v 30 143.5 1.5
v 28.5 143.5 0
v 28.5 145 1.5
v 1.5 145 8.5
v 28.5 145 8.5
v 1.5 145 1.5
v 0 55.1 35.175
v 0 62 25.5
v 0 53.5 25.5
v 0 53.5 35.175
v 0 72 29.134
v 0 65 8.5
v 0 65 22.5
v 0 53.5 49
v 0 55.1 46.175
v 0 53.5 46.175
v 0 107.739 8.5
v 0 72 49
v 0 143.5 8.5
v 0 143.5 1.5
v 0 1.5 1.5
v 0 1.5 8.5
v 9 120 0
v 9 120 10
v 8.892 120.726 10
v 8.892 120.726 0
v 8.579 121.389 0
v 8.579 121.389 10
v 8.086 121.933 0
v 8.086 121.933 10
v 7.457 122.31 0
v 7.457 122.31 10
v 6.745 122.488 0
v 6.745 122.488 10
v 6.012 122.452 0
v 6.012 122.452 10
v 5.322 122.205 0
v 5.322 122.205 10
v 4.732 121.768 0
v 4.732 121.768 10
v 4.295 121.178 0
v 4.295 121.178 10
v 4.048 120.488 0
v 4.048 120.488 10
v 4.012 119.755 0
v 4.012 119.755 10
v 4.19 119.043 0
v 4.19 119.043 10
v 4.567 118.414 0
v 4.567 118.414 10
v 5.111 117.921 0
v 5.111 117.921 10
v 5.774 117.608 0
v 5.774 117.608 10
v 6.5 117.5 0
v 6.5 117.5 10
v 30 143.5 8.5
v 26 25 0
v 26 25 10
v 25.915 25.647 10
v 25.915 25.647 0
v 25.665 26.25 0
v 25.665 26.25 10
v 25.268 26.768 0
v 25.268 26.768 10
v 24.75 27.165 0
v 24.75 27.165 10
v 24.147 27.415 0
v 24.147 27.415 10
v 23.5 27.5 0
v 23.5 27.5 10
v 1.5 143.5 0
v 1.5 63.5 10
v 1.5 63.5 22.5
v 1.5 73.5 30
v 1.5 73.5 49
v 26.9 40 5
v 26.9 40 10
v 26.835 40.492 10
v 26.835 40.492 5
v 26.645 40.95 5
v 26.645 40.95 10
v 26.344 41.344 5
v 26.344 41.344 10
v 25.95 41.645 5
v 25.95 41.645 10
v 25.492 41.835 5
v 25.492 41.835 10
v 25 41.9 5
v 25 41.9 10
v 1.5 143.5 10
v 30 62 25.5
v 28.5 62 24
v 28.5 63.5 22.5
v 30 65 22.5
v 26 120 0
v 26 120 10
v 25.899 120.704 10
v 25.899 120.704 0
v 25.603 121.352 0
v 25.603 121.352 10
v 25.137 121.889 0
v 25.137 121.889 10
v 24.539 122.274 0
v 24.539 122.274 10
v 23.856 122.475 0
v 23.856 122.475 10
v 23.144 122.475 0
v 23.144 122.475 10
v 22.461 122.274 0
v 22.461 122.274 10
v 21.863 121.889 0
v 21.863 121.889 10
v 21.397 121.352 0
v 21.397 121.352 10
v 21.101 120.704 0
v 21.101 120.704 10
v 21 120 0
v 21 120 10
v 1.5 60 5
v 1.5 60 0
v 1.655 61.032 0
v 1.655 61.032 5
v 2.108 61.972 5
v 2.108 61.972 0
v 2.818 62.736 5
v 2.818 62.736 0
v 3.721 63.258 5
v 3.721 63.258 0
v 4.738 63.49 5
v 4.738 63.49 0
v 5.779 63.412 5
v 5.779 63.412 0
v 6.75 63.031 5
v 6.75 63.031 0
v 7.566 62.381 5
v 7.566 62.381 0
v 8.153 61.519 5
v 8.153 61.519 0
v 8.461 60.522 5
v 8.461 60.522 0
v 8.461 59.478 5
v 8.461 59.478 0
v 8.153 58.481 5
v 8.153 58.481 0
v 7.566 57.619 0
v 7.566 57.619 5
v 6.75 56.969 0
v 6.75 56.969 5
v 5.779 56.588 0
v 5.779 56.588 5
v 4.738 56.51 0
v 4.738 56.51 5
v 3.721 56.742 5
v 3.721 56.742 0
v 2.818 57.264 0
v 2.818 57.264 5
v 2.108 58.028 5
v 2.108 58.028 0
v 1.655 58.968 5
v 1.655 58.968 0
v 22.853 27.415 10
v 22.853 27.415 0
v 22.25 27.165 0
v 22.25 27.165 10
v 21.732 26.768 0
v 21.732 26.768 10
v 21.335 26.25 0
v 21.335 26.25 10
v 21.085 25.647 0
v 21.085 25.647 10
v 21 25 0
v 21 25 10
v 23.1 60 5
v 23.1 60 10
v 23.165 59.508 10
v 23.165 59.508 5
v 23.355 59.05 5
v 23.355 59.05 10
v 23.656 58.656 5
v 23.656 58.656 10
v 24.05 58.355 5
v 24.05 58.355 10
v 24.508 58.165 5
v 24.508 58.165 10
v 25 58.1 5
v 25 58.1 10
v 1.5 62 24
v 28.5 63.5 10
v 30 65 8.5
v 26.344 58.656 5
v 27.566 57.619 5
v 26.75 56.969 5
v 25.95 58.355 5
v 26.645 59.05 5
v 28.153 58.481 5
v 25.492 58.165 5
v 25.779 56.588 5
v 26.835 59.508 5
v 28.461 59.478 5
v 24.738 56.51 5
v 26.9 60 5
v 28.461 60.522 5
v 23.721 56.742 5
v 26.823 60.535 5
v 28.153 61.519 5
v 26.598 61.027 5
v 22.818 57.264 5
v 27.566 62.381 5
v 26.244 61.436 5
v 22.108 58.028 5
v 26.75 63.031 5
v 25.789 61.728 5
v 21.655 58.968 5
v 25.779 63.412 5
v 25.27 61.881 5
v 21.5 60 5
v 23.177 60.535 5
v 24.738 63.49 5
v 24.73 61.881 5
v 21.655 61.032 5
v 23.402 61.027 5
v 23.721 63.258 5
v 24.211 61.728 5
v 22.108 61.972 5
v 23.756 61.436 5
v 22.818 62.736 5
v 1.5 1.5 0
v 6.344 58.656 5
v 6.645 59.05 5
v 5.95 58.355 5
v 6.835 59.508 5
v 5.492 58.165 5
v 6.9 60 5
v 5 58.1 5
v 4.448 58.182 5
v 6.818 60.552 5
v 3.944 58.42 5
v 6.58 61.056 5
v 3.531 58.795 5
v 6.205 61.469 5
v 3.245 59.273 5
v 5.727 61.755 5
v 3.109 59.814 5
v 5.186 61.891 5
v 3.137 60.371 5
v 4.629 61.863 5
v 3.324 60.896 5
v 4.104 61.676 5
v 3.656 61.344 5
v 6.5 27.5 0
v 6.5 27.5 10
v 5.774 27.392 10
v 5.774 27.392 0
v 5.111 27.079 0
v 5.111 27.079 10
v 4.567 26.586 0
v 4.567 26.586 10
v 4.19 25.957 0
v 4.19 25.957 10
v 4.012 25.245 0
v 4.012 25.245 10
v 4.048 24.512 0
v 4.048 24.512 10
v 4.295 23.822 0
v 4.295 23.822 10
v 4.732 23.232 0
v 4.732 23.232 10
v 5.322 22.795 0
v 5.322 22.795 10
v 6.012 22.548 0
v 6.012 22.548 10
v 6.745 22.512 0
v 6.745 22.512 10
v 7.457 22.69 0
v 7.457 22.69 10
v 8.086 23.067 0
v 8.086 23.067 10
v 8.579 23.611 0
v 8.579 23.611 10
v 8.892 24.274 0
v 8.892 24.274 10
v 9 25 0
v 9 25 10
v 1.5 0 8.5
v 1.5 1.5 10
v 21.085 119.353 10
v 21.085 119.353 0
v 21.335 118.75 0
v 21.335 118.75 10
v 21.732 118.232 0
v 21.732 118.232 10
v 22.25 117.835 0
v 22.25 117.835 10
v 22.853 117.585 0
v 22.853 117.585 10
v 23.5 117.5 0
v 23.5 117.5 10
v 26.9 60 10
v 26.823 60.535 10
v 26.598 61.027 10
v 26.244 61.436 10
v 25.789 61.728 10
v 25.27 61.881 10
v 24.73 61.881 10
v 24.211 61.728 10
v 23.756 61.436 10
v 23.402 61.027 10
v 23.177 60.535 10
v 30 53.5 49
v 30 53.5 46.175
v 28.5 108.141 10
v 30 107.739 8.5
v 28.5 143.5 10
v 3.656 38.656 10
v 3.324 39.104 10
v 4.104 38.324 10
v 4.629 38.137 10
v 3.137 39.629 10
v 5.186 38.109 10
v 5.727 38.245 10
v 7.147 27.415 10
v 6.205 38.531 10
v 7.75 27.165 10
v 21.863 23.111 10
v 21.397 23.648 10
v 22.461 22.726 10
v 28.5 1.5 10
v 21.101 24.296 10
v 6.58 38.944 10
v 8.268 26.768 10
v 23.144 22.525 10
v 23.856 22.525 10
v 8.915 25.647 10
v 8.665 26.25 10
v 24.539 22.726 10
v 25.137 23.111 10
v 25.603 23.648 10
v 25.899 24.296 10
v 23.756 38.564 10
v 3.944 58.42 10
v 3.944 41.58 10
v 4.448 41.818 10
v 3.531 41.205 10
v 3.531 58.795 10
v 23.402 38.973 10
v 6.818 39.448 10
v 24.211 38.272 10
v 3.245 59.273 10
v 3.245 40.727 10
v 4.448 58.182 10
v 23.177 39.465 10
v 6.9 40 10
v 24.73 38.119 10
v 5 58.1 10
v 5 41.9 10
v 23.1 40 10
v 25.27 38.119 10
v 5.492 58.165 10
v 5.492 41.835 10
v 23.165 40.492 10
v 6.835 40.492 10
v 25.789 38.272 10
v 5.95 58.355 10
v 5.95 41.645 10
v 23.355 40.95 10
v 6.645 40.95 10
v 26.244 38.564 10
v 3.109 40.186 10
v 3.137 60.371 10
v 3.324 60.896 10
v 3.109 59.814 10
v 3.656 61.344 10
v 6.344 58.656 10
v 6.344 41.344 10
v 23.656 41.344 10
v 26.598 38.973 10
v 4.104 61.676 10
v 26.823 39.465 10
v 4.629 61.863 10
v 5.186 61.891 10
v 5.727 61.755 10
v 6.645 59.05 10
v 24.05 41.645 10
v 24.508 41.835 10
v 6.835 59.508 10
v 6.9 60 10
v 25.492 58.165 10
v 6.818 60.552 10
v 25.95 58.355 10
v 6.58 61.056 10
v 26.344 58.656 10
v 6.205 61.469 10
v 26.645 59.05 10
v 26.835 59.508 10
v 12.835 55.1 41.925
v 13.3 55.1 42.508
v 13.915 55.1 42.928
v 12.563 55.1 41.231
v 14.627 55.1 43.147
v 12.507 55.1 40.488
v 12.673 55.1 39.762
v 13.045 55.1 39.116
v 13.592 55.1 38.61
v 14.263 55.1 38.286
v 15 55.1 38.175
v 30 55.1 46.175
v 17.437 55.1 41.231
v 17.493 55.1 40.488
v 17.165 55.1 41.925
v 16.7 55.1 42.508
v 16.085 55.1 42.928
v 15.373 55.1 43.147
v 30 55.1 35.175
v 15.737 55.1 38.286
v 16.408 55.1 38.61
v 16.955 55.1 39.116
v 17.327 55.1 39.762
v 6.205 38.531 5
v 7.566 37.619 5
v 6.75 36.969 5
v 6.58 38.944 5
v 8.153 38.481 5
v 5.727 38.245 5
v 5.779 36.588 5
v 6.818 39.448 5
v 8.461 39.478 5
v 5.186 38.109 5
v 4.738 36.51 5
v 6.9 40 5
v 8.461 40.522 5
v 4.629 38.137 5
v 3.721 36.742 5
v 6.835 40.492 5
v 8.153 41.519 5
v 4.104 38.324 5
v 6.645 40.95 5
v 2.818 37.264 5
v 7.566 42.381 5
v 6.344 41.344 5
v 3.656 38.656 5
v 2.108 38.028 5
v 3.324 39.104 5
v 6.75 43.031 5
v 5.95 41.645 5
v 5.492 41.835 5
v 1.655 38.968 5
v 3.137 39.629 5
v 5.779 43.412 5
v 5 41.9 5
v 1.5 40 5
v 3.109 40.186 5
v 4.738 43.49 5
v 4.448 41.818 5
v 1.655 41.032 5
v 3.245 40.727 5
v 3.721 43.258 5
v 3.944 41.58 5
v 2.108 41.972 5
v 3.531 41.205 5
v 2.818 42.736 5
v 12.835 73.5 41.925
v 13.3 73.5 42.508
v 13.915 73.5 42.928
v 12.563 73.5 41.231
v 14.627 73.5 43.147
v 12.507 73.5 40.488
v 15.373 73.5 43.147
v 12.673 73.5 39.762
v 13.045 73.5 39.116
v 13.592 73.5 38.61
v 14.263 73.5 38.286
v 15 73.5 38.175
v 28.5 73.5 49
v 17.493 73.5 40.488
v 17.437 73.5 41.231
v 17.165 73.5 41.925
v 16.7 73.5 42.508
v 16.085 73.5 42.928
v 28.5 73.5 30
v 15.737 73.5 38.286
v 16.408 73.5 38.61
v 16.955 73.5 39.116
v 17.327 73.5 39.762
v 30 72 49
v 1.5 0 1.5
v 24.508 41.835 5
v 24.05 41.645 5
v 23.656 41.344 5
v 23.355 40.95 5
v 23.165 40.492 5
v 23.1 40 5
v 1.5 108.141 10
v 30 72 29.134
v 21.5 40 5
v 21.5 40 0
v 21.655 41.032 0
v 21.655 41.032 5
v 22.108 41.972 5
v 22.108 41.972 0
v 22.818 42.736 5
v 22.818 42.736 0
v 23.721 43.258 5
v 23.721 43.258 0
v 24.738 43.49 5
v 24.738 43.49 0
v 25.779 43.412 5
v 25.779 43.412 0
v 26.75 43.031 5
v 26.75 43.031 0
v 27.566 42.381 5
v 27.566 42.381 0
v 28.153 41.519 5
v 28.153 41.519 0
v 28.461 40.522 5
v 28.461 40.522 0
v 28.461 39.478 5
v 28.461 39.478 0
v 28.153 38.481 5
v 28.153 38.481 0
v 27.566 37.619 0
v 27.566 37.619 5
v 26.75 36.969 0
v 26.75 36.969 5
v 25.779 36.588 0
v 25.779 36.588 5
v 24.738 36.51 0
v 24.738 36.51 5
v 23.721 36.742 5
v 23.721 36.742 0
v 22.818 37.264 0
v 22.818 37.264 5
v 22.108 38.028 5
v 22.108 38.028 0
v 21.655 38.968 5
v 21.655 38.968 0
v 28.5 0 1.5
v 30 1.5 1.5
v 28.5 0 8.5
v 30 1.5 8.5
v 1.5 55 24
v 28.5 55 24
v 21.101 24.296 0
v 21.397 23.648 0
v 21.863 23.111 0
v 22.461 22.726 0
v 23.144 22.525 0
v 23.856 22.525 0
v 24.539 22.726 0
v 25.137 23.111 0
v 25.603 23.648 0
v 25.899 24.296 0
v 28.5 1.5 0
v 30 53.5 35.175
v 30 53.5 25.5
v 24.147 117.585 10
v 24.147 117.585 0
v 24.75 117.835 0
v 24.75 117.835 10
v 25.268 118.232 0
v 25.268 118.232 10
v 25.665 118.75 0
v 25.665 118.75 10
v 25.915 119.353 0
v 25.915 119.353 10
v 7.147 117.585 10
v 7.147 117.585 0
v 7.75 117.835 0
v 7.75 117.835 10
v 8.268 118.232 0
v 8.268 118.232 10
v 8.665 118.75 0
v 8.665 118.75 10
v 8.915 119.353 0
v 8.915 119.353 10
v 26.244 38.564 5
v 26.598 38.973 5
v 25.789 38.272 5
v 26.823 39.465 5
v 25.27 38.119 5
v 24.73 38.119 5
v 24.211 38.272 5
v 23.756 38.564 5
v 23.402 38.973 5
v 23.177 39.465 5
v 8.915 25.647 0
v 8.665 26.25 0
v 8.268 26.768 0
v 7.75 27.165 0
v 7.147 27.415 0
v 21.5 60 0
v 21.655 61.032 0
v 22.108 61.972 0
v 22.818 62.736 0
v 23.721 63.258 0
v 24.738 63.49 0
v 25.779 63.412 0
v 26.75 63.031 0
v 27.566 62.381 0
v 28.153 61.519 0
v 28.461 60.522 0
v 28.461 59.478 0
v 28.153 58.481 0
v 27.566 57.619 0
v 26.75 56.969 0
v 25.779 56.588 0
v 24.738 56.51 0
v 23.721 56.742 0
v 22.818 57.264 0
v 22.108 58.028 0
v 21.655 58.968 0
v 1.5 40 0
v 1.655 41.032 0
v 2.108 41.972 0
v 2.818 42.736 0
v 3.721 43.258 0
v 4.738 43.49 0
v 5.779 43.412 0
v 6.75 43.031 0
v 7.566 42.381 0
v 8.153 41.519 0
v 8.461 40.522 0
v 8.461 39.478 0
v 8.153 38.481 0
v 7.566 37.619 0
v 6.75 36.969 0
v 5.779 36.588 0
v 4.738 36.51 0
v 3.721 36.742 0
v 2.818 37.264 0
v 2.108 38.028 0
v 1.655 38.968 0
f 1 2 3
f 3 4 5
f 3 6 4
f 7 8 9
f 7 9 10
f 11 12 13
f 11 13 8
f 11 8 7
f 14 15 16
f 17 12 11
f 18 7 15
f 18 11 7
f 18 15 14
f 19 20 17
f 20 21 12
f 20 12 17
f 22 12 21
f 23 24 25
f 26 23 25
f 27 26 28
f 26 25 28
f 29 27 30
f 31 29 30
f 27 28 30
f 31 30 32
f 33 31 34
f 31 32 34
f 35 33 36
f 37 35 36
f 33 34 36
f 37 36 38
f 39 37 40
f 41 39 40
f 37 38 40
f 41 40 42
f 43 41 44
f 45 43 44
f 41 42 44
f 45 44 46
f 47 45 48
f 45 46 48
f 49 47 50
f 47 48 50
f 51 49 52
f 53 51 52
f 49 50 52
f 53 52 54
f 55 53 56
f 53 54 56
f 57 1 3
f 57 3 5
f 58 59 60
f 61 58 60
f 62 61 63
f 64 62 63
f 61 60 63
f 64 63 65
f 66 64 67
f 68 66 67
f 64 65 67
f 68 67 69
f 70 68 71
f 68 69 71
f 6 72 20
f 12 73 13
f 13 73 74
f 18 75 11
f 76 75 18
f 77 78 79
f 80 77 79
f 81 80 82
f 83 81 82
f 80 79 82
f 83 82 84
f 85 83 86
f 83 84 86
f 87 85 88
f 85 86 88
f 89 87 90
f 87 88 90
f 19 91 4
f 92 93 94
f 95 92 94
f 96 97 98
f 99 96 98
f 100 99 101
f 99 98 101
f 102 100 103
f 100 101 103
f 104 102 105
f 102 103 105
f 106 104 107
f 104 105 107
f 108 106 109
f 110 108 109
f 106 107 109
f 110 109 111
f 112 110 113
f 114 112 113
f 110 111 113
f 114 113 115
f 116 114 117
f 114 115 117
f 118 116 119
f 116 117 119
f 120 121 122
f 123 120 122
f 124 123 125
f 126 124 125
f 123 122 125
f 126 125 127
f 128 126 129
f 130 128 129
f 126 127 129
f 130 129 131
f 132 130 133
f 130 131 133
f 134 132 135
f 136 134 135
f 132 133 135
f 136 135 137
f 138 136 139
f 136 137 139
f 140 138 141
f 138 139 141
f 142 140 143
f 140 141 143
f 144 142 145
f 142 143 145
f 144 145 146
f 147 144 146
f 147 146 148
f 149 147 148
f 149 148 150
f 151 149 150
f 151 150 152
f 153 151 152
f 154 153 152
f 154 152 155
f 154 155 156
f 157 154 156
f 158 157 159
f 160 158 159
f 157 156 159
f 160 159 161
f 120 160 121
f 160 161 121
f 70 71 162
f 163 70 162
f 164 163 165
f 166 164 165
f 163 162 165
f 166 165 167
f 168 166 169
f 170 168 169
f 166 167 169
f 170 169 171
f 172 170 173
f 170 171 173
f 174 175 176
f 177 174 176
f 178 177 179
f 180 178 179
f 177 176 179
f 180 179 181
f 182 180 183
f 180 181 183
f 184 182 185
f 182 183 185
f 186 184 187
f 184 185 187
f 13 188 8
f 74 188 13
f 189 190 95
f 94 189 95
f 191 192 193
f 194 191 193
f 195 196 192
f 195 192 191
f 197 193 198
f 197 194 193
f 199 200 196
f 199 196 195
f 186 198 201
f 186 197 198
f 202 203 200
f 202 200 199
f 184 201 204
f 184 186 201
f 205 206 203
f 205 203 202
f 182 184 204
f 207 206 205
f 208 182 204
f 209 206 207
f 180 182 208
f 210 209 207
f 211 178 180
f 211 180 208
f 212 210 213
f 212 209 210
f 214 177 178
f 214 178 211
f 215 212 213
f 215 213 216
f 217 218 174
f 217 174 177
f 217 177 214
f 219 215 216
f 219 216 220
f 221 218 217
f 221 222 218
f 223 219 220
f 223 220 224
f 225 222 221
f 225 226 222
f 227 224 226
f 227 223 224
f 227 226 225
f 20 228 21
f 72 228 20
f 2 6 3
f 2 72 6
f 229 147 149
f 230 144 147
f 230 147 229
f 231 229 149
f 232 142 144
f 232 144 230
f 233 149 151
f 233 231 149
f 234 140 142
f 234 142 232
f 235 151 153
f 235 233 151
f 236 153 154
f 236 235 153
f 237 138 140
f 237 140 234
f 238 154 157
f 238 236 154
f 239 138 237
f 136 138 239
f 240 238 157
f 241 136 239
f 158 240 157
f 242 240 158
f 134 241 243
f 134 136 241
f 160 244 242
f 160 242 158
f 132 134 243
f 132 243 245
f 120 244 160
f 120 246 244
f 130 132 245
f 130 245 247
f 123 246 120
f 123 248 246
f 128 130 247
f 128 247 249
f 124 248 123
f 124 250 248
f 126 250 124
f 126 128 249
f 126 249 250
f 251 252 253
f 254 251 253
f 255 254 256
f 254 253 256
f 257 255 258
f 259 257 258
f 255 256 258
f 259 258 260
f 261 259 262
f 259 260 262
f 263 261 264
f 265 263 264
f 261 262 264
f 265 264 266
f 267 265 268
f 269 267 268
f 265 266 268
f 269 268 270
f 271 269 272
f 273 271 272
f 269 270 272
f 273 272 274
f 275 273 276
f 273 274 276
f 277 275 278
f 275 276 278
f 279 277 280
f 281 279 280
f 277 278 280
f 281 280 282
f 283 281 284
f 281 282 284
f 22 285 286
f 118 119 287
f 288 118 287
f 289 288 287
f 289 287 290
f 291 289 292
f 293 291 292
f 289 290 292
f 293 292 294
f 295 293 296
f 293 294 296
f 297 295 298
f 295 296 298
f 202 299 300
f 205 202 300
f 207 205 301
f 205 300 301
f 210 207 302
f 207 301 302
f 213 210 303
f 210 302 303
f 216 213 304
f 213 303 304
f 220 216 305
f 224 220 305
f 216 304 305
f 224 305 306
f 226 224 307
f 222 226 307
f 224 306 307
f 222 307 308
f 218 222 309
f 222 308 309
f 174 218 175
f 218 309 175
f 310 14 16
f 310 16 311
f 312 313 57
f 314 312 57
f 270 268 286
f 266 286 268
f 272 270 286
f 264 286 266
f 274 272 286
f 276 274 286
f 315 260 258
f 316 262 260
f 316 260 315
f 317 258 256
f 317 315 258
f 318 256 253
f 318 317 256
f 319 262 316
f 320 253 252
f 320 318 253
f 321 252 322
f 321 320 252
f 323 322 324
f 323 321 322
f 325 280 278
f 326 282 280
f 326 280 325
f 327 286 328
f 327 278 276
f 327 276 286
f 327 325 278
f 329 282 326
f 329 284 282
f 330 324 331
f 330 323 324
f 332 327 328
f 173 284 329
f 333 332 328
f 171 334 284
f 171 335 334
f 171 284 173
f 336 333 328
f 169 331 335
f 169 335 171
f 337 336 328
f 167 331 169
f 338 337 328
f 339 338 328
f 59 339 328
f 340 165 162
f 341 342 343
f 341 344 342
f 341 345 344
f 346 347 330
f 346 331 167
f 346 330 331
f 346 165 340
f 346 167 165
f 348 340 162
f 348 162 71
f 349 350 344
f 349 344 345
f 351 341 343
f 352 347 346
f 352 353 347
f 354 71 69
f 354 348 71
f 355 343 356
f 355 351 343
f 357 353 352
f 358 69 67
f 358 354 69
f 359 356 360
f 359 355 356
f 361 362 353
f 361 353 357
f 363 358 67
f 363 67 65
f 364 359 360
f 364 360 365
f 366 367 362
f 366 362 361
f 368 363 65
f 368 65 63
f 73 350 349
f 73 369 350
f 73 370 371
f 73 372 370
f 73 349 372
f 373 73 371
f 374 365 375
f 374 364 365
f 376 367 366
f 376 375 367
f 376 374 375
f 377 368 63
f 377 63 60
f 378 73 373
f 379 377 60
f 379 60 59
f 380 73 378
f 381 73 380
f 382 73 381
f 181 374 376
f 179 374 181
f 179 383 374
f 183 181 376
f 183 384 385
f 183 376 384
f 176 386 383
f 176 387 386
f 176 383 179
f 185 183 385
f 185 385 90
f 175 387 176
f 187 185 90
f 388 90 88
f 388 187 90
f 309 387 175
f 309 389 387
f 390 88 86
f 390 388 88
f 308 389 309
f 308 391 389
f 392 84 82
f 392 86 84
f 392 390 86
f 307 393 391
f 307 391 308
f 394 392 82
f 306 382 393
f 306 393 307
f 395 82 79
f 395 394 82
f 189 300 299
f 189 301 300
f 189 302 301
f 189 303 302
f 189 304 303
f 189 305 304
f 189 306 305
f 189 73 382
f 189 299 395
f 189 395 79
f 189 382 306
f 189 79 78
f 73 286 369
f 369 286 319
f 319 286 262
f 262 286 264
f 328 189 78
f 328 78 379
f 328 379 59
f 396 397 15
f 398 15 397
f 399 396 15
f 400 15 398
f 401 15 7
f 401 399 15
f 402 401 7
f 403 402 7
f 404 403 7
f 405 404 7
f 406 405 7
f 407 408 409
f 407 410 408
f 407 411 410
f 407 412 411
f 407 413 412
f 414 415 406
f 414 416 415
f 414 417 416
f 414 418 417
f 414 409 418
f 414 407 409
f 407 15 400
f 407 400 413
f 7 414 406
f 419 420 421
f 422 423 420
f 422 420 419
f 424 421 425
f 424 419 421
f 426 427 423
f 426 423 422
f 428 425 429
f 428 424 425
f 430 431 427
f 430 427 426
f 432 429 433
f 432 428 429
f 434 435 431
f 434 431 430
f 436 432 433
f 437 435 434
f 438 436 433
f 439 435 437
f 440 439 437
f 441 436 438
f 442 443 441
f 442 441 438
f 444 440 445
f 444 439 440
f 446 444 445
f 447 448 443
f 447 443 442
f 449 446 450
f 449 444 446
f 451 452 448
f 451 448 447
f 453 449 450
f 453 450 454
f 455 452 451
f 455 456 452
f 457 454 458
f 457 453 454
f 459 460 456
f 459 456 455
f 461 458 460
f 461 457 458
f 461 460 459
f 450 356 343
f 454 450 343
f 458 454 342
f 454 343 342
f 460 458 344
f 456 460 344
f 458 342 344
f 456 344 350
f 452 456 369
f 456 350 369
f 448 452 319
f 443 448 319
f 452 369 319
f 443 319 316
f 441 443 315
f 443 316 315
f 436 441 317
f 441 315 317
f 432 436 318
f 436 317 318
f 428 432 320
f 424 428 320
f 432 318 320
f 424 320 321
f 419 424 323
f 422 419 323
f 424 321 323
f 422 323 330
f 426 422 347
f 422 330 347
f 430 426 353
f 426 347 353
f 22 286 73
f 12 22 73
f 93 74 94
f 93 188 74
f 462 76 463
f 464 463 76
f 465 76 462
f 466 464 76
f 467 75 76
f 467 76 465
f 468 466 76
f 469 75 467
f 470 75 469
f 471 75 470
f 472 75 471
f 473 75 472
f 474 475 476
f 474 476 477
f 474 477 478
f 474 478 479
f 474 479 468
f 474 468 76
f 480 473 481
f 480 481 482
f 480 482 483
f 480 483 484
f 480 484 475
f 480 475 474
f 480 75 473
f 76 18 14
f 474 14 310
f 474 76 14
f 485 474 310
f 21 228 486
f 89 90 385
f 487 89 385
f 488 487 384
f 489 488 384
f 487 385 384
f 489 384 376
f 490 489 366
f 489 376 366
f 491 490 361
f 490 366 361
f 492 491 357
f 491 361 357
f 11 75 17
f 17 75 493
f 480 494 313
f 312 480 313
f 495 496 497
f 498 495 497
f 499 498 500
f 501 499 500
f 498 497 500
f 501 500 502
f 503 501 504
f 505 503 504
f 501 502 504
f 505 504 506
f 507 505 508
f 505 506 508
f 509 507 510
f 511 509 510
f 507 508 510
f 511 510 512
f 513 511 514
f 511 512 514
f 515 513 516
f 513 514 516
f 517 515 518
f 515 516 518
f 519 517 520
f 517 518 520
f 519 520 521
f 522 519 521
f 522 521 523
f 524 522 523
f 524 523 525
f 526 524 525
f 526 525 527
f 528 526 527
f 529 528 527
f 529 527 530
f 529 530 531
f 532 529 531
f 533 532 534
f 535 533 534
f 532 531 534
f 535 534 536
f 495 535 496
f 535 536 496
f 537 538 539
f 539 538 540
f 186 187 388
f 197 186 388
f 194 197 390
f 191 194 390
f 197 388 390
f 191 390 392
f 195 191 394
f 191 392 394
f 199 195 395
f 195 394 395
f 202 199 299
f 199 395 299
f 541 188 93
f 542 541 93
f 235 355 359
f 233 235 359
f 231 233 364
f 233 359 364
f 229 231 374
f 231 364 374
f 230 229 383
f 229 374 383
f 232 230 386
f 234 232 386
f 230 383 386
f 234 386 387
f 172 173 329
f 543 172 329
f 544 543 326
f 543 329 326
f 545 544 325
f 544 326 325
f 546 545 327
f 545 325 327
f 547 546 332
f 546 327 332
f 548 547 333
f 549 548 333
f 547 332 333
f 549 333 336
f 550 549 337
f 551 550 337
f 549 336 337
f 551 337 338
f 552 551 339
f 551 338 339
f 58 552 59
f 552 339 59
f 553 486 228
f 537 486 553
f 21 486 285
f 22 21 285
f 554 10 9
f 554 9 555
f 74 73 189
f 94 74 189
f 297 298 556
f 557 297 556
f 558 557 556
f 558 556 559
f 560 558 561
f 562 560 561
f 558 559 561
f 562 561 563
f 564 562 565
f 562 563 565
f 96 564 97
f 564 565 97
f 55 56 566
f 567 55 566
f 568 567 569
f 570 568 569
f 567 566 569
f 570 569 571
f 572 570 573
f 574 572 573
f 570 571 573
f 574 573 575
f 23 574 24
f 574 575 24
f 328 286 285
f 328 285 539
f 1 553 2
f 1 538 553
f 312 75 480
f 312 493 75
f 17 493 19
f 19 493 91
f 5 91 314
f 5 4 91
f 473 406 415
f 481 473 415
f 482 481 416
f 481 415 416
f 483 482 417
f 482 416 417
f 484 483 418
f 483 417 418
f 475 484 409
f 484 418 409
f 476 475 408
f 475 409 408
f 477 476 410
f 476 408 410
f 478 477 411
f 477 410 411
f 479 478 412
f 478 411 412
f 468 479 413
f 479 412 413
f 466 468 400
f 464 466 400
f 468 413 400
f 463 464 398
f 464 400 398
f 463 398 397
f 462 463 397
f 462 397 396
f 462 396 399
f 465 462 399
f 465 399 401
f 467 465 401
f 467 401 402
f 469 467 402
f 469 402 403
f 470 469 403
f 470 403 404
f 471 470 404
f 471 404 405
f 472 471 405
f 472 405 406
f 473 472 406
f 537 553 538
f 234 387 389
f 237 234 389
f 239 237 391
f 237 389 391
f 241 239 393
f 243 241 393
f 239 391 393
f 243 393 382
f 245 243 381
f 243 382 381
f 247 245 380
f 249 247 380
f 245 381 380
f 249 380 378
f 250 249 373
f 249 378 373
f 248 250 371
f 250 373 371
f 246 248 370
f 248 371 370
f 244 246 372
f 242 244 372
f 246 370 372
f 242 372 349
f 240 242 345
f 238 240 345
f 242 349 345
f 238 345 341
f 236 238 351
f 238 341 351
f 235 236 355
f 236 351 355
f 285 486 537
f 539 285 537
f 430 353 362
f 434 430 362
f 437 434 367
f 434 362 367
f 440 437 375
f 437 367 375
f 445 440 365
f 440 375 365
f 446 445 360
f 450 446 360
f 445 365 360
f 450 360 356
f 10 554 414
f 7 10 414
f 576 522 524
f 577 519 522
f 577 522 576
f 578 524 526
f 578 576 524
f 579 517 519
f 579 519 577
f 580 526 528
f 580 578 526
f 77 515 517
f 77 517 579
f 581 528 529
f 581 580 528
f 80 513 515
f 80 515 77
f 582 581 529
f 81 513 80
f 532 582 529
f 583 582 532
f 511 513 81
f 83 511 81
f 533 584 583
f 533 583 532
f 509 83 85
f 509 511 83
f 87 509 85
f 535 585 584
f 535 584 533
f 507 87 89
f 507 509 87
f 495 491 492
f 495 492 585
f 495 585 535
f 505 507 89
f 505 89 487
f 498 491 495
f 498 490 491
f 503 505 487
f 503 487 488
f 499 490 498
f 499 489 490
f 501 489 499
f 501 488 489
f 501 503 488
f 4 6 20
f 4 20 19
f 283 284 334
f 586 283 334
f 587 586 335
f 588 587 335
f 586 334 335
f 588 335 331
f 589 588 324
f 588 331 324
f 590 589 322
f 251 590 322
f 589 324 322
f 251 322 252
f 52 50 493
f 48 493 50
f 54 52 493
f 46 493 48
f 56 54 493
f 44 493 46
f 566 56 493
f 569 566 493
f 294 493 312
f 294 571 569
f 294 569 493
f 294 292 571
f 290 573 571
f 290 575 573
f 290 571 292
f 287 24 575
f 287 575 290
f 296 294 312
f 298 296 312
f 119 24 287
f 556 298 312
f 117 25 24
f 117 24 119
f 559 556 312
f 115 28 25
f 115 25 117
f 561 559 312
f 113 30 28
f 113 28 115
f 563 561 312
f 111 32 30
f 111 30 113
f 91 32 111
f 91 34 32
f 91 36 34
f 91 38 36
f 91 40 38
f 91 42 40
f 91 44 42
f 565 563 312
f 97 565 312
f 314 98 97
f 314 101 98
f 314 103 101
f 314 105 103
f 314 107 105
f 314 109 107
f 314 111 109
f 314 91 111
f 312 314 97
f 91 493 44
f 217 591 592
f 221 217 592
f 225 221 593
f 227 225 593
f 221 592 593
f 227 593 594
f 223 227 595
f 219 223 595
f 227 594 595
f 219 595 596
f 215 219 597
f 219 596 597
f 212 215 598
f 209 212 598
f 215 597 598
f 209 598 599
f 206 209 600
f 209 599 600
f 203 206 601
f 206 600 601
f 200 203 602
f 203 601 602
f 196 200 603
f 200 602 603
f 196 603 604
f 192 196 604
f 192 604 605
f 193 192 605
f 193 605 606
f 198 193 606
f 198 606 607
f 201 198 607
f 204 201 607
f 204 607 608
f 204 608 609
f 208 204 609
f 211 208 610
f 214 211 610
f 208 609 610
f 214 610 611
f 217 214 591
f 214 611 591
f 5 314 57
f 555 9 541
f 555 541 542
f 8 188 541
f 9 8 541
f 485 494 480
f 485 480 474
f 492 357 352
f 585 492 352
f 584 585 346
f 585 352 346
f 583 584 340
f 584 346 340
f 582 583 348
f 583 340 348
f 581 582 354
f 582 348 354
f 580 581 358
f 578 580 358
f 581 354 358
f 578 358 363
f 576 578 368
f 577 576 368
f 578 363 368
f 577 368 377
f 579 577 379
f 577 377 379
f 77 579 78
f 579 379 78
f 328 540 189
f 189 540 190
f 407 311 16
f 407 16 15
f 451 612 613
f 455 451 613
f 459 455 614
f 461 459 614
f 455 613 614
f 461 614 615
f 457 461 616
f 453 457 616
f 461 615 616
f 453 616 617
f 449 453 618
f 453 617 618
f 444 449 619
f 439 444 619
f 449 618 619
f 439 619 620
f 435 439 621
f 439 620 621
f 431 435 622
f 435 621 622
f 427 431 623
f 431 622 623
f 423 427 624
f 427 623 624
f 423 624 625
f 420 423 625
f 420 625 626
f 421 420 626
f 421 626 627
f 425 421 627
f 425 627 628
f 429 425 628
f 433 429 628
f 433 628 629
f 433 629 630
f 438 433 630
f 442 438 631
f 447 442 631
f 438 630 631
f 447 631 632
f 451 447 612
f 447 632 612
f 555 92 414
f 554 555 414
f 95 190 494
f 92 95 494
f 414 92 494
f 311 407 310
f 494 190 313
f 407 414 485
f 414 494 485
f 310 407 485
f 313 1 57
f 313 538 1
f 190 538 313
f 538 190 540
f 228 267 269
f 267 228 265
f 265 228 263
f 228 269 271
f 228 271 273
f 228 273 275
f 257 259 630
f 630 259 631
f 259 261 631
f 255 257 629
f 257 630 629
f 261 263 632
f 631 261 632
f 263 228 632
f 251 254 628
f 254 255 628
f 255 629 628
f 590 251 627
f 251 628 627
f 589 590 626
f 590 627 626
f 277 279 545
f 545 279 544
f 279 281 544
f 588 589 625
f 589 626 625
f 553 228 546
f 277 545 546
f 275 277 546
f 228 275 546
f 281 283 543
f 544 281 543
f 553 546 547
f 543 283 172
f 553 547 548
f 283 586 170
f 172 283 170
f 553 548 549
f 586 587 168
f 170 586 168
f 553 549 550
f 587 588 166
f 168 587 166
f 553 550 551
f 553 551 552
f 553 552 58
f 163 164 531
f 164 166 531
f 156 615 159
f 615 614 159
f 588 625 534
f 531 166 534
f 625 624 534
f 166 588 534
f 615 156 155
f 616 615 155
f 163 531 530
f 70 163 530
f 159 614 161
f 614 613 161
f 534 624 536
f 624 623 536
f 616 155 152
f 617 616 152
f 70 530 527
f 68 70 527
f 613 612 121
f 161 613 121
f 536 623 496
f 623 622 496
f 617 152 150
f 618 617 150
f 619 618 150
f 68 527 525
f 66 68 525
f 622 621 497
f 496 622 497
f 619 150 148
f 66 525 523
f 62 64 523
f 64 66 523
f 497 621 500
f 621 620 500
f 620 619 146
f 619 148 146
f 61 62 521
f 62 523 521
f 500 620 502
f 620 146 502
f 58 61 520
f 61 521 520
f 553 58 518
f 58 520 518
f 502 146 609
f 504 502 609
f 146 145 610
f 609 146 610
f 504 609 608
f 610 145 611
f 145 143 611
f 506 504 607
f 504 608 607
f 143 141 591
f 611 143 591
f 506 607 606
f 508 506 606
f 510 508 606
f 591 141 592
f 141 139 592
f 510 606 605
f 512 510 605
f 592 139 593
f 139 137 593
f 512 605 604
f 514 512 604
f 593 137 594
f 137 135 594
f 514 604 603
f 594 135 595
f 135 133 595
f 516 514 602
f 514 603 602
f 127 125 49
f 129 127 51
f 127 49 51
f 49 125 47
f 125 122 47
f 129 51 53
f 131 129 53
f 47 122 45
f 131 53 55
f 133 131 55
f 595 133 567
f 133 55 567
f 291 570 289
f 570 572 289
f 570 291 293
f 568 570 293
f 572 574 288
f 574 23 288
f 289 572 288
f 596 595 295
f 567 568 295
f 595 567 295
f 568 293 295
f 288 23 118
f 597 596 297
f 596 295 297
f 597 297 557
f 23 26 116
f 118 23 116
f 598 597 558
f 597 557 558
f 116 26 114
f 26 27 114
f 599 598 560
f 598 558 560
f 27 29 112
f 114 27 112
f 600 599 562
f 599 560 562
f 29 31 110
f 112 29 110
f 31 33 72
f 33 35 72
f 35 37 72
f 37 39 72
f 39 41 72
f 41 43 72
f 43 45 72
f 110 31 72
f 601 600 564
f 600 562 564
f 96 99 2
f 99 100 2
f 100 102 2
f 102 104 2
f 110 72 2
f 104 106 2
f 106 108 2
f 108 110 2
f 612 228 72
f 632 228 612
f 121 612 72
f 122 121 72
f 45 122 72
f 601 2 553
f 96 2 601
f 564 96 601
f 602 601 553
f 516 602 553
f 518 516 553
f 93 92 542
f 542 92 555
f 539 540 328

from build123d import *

# Parameters (mm, degrees)
SKETCH1_W           = 30
SKETCH1_H           = 145
BOSS_EXTRUDE1_DEPTH = 10
CUT_EXTRUDE1_DEPTH  = 32
CUT_EXTRUDE2_DEPTH  = 32
SKETCH4_R           = 3.5
CUT_EXTRUDE3_DEPTH  = 5
SKETCH5_W           = 30
SKETCH5_H           = 10
BOSS_EXTRUDE2_DEPTH = 39
SKETCH6_W           = 30
SKETCH6_H           = 25
BOSS_EXTRUDE3_DEPTH = 10
SKETCH7_W           = 11
SKETCH7_H           = 1.6
CUT_EXTRUDE4_DEPTH  = 61
SKETCH8_R           = 2.5
CUT_EXTRUDE5_DEPTH  = 61
CHAMFER1_SIZE       = 20
CHAMFER1_SIZE2      = 34.641016151
CHAMFER2_SIZE       = 1.5


with BuildPart() as part:
    # Sketch1 → Boss-Extrude1 (new body)
    with BuildSketch(Plane.XY):
        with Locations((15, 72.5)):
            Rectangle(SKETCH1_W, SKETCH1_H)
    extrude(amount=BOSS_EXTRUDE1_DEPTH)

    # Sketch2 → Cut-Extrude1 (cut)
    with BuildSketch(Plane.XY.offset(10)):
        with BuildLine():
            Line((6.5, 117.5), (6.5, 120))
            Line((6.5, 120), (9, 120))
            ThreePointArc((9, 120), (4.732233047, 121.767766953), (6.5, 117.5))
        make_face()
        with BuildLine():
            Line((9, 120), (6.5, 120))
            Line((6.5, 120), (6.5, 117.5))
            ThreePointArc((6.5, 117.5), (8.267766953, 118.232233047), (9, 120))
        make_face()
        with BuildLine():
            ThreePointArc((26, 120), (23.5, 122.5), (21, 120))
            Line((21, 120), (23.5, 120))
            Line((23.5, 120), (23.5, 117.5))
            ThreePointArc((23.5, 117.5), (25.267766953, 118.232233047), (26, 120))
        make_face()
        with BuildLine():
            Line((23.5, 120), (21, 120))
            ThreePointArc((21, 120), (21.732233047, 118.232233047), (23.5, 117.5))
            Line((23.5, 117.5), (23.5, 120))
        make_face()
        with BuildLine():
            ThreePointArc((26, 25), (25.267766953, 26.767766953), (23.5, 27.5))
            Line((23.5, 27.5), (23.5, 25))
            Line((23.5, 25), (21, 25))
            ThreePointArc((21, 25), (23.5, 22.5), (26, 25))
        make_face()
        with BuildLine():
            Line((23.5, 25), (23.5, 27.5))
            ThreePointArc((23.5, 27.5), (21.732233047, 26.767766953), (21, 25))
            Line((21, 25), (23.5, 25))
        make_face()
        with BuildLine():
            ThreePointArc((9, 25), (8.267766953, 26.767766953), (6.5, 27.5))
            Line((6.5, 27.5), (6.5, 25))
            Line((6.5, 25), (9, 25))
        make_face()
        with BuildLine():
            Line((6.5, 25), (6.5, 27.5))
            ThreePointArc((6.5, 27.5), (4.732233047, 23.232233047), (9, 25))
            Line((9, 25), (6.5, 25))
        make_face()
    extrude(amount=-CUT_EXTRUDE1_DEPTH, mode=Mode.SUBTRACT)

    # Sketch3 → Cut-Extrude2 (cut)
    with BuildSketch(Plane.XY.offset(10)):
        with BuildLine():
            ThreePointArc((6.9, 60), (3.656497116, 61.343502884), (5, 58.1))
            Line((5, 58.1), (5, 60))
            Line((5, 60), (6.9, 60))
        make_face()
        with BuildLine():
            Line((5, 60), (5, 58.1))
            ThreePointArc((5, 58.1), (6.343502884, 58.656497116), (6.9, 60))
            Line((6.9, 60), (5, 60))
        make_face()
        with BuildLine():
            ThreePointArc((23.1, 60), (23.656497116, 58.656497116), (25, 58.1))
            Line((25, 58.1), (25, 60))
            Line((25, 60), (23.1, 60))
        make_face()
        with BuildLine():
            Line((25, 60), (25, 58.1))
            ThreePointArc((25, 58.1), (26.343502884, 58.656497116), (26.9, 60))
            ThreePointArc((26.9, 60), (25, 61.9), (23.1, 60))
            Line((23.1, 60), (25, 60))
        make_face()
        with BuildLine():
            Line((5, 41.9), (5, 40))
            Line((5, 40), (6.9, 40))
            ThreePointArc((6.9, 40), (6.343502884, 41.343502884), (5, 41.9))
        make_face()
        with BuildLine():
            Line((6.9, 40), (5, 40))
            Line((5, 40), (5, 41.9))
            ThreePointArc((5, 41.9), (3.656497116, 38.656497116), (6.9, 40))
        make_face()
        with BuildLine():
            ThreePointArc((25, 41.9), (23.656497116, 41.343502884), (23.1, 40))
            Line((23.1, 40), (25, 40))
            Line((25, 40), (25, 41.9))
        make_face()
        with BuildLine():
            Line((25, 40), (23.1, 40))
            ThreePointArc((23.1, 40), (25, 38.1), (26.9, 40))
            ThreePointArc((26.9, 40), (26.343502884, 41.343502884), (25, 41.9))
            Line((25, 41.9), (25, 40))
        make_face()
    extrude(amount=-CUT_EXTRUDE2_DEPTH, mode=Mode.SUBTRACT)

    # Sketch4 → Cut-Extrude3 (cut)
    with BuildSketch(Plane(origin=(0, 0, 0), x_dir=(-1, 0, 0), z_dir=(0, 0, -1))):
        with Locations((-5, 60)):
            Circle(SKETCH4_R)
        with Locations((-5, 40)):
            Circle(SKETCH4_R)
        with Locations((-25, 40)):
            Circle(SKETCH4_R)
        with Locations((-25, 60)):
            Circle(SKETCH4_R)
    extrude(amount=-CUT_EXTRUDE3_DEPTH, mode=Mode.SUBTRACT)

    # Sketch5 → Boss-Extrude2 (add)
    with BuildSketch(Plane.XY.offset(10)):
        with Locations((15, 68.5)):
            Rectangle(SKETCH5_W, SKETCH5_H)
    extrude(amount=BOSS_EXTRUDE2_DEPTH)

    # Sketch6 → Boss-Extrude3 (add)
    with BuildSketch(Plane.XZ.offset(-63.5)):
        with Locations((15, 36.5)):
            Rectangle(SKETCH6_W, SKETCH6_H)
    extrude(amount=BOSS_EXTRUDE3_DEPTH)

    # Sketch7 → Cut-Extrude4 (cut)
    with BuildSketch(Plane(origin=(30, 0, 0), x_dir=(0, 0, -1), z_dir=(1, 0, 0))):
        with Locations((-40.675105606, 54.3)):
            Rectangle(SKETCH7_W, SKETCH7_H)
    extrude(amount=-CUT_EXTRUDE4_DEPTH, mode=Mode.SUBTRACT)

    # Sketch8 → Cut-Extrude5 (cut)
    with BuildSketch(Plane.XZ.offset(-55.1)):
        with Locations(Location((15, 40.675105606, 0), (0, 0, 270))):
            Circle(SKETCH8_R)
    extrude(amount=-CUT_EXTRUDE5_DEPTH, mode=Mode.SUBTRACT)

    # Chamfer1
    chamfer1_edges = [part.edges().sort_by_distance(p)[0] for p in [
        (15, 73.5, 10),
    ]]
    chamfer1_side = [part.faces().sort_by_distance(p)[0] for p in [
        (15, 73.5, 29.309258212),
    ]]
    chamfer(chamfer1_edges, length=CHAMFER1_SIZE, length2=CHAMFER1_SIZE2, reference=chamfer1_side[0])

    # Chamfer2
    chamfer2_edges = [part.edges().sort_by_distance(p)[0] for p in [
        (30, 63.5, 17),
        (0, 63.5, 17),
        (15, 63.5, 24),
        (0, 58.5, 24),
        (30, 58.5, 24),
        (15, 53.5, 24),
        (30, 31.75, 10),
        (30, 126.570508076, 10),
        (0, 90.820508076, 20),
        (30, 90.820508076, 20),
        (15, 145, 10),
        (0, 126.570508076, 10),
        (15, 145, 0),
        (30, 72.5, 0),
        (15, 0, 0),
        (0, 72.5, 0),
        (0, 145, 5),
        (30, 145, 5),
        (30, 0, 5),
        (0, 0, 5),
        (15, 0, 10),
        (0, 31.75, 10),
        (0, 73.5, 39.5),
        (30, 73.5, 39.5),
    ]]
    chamfer(chamfer2_edges, length=CHAMFER2_SIZE - 0.0001)  # a hair under: the kernel refuses the full size


solid = part.part
